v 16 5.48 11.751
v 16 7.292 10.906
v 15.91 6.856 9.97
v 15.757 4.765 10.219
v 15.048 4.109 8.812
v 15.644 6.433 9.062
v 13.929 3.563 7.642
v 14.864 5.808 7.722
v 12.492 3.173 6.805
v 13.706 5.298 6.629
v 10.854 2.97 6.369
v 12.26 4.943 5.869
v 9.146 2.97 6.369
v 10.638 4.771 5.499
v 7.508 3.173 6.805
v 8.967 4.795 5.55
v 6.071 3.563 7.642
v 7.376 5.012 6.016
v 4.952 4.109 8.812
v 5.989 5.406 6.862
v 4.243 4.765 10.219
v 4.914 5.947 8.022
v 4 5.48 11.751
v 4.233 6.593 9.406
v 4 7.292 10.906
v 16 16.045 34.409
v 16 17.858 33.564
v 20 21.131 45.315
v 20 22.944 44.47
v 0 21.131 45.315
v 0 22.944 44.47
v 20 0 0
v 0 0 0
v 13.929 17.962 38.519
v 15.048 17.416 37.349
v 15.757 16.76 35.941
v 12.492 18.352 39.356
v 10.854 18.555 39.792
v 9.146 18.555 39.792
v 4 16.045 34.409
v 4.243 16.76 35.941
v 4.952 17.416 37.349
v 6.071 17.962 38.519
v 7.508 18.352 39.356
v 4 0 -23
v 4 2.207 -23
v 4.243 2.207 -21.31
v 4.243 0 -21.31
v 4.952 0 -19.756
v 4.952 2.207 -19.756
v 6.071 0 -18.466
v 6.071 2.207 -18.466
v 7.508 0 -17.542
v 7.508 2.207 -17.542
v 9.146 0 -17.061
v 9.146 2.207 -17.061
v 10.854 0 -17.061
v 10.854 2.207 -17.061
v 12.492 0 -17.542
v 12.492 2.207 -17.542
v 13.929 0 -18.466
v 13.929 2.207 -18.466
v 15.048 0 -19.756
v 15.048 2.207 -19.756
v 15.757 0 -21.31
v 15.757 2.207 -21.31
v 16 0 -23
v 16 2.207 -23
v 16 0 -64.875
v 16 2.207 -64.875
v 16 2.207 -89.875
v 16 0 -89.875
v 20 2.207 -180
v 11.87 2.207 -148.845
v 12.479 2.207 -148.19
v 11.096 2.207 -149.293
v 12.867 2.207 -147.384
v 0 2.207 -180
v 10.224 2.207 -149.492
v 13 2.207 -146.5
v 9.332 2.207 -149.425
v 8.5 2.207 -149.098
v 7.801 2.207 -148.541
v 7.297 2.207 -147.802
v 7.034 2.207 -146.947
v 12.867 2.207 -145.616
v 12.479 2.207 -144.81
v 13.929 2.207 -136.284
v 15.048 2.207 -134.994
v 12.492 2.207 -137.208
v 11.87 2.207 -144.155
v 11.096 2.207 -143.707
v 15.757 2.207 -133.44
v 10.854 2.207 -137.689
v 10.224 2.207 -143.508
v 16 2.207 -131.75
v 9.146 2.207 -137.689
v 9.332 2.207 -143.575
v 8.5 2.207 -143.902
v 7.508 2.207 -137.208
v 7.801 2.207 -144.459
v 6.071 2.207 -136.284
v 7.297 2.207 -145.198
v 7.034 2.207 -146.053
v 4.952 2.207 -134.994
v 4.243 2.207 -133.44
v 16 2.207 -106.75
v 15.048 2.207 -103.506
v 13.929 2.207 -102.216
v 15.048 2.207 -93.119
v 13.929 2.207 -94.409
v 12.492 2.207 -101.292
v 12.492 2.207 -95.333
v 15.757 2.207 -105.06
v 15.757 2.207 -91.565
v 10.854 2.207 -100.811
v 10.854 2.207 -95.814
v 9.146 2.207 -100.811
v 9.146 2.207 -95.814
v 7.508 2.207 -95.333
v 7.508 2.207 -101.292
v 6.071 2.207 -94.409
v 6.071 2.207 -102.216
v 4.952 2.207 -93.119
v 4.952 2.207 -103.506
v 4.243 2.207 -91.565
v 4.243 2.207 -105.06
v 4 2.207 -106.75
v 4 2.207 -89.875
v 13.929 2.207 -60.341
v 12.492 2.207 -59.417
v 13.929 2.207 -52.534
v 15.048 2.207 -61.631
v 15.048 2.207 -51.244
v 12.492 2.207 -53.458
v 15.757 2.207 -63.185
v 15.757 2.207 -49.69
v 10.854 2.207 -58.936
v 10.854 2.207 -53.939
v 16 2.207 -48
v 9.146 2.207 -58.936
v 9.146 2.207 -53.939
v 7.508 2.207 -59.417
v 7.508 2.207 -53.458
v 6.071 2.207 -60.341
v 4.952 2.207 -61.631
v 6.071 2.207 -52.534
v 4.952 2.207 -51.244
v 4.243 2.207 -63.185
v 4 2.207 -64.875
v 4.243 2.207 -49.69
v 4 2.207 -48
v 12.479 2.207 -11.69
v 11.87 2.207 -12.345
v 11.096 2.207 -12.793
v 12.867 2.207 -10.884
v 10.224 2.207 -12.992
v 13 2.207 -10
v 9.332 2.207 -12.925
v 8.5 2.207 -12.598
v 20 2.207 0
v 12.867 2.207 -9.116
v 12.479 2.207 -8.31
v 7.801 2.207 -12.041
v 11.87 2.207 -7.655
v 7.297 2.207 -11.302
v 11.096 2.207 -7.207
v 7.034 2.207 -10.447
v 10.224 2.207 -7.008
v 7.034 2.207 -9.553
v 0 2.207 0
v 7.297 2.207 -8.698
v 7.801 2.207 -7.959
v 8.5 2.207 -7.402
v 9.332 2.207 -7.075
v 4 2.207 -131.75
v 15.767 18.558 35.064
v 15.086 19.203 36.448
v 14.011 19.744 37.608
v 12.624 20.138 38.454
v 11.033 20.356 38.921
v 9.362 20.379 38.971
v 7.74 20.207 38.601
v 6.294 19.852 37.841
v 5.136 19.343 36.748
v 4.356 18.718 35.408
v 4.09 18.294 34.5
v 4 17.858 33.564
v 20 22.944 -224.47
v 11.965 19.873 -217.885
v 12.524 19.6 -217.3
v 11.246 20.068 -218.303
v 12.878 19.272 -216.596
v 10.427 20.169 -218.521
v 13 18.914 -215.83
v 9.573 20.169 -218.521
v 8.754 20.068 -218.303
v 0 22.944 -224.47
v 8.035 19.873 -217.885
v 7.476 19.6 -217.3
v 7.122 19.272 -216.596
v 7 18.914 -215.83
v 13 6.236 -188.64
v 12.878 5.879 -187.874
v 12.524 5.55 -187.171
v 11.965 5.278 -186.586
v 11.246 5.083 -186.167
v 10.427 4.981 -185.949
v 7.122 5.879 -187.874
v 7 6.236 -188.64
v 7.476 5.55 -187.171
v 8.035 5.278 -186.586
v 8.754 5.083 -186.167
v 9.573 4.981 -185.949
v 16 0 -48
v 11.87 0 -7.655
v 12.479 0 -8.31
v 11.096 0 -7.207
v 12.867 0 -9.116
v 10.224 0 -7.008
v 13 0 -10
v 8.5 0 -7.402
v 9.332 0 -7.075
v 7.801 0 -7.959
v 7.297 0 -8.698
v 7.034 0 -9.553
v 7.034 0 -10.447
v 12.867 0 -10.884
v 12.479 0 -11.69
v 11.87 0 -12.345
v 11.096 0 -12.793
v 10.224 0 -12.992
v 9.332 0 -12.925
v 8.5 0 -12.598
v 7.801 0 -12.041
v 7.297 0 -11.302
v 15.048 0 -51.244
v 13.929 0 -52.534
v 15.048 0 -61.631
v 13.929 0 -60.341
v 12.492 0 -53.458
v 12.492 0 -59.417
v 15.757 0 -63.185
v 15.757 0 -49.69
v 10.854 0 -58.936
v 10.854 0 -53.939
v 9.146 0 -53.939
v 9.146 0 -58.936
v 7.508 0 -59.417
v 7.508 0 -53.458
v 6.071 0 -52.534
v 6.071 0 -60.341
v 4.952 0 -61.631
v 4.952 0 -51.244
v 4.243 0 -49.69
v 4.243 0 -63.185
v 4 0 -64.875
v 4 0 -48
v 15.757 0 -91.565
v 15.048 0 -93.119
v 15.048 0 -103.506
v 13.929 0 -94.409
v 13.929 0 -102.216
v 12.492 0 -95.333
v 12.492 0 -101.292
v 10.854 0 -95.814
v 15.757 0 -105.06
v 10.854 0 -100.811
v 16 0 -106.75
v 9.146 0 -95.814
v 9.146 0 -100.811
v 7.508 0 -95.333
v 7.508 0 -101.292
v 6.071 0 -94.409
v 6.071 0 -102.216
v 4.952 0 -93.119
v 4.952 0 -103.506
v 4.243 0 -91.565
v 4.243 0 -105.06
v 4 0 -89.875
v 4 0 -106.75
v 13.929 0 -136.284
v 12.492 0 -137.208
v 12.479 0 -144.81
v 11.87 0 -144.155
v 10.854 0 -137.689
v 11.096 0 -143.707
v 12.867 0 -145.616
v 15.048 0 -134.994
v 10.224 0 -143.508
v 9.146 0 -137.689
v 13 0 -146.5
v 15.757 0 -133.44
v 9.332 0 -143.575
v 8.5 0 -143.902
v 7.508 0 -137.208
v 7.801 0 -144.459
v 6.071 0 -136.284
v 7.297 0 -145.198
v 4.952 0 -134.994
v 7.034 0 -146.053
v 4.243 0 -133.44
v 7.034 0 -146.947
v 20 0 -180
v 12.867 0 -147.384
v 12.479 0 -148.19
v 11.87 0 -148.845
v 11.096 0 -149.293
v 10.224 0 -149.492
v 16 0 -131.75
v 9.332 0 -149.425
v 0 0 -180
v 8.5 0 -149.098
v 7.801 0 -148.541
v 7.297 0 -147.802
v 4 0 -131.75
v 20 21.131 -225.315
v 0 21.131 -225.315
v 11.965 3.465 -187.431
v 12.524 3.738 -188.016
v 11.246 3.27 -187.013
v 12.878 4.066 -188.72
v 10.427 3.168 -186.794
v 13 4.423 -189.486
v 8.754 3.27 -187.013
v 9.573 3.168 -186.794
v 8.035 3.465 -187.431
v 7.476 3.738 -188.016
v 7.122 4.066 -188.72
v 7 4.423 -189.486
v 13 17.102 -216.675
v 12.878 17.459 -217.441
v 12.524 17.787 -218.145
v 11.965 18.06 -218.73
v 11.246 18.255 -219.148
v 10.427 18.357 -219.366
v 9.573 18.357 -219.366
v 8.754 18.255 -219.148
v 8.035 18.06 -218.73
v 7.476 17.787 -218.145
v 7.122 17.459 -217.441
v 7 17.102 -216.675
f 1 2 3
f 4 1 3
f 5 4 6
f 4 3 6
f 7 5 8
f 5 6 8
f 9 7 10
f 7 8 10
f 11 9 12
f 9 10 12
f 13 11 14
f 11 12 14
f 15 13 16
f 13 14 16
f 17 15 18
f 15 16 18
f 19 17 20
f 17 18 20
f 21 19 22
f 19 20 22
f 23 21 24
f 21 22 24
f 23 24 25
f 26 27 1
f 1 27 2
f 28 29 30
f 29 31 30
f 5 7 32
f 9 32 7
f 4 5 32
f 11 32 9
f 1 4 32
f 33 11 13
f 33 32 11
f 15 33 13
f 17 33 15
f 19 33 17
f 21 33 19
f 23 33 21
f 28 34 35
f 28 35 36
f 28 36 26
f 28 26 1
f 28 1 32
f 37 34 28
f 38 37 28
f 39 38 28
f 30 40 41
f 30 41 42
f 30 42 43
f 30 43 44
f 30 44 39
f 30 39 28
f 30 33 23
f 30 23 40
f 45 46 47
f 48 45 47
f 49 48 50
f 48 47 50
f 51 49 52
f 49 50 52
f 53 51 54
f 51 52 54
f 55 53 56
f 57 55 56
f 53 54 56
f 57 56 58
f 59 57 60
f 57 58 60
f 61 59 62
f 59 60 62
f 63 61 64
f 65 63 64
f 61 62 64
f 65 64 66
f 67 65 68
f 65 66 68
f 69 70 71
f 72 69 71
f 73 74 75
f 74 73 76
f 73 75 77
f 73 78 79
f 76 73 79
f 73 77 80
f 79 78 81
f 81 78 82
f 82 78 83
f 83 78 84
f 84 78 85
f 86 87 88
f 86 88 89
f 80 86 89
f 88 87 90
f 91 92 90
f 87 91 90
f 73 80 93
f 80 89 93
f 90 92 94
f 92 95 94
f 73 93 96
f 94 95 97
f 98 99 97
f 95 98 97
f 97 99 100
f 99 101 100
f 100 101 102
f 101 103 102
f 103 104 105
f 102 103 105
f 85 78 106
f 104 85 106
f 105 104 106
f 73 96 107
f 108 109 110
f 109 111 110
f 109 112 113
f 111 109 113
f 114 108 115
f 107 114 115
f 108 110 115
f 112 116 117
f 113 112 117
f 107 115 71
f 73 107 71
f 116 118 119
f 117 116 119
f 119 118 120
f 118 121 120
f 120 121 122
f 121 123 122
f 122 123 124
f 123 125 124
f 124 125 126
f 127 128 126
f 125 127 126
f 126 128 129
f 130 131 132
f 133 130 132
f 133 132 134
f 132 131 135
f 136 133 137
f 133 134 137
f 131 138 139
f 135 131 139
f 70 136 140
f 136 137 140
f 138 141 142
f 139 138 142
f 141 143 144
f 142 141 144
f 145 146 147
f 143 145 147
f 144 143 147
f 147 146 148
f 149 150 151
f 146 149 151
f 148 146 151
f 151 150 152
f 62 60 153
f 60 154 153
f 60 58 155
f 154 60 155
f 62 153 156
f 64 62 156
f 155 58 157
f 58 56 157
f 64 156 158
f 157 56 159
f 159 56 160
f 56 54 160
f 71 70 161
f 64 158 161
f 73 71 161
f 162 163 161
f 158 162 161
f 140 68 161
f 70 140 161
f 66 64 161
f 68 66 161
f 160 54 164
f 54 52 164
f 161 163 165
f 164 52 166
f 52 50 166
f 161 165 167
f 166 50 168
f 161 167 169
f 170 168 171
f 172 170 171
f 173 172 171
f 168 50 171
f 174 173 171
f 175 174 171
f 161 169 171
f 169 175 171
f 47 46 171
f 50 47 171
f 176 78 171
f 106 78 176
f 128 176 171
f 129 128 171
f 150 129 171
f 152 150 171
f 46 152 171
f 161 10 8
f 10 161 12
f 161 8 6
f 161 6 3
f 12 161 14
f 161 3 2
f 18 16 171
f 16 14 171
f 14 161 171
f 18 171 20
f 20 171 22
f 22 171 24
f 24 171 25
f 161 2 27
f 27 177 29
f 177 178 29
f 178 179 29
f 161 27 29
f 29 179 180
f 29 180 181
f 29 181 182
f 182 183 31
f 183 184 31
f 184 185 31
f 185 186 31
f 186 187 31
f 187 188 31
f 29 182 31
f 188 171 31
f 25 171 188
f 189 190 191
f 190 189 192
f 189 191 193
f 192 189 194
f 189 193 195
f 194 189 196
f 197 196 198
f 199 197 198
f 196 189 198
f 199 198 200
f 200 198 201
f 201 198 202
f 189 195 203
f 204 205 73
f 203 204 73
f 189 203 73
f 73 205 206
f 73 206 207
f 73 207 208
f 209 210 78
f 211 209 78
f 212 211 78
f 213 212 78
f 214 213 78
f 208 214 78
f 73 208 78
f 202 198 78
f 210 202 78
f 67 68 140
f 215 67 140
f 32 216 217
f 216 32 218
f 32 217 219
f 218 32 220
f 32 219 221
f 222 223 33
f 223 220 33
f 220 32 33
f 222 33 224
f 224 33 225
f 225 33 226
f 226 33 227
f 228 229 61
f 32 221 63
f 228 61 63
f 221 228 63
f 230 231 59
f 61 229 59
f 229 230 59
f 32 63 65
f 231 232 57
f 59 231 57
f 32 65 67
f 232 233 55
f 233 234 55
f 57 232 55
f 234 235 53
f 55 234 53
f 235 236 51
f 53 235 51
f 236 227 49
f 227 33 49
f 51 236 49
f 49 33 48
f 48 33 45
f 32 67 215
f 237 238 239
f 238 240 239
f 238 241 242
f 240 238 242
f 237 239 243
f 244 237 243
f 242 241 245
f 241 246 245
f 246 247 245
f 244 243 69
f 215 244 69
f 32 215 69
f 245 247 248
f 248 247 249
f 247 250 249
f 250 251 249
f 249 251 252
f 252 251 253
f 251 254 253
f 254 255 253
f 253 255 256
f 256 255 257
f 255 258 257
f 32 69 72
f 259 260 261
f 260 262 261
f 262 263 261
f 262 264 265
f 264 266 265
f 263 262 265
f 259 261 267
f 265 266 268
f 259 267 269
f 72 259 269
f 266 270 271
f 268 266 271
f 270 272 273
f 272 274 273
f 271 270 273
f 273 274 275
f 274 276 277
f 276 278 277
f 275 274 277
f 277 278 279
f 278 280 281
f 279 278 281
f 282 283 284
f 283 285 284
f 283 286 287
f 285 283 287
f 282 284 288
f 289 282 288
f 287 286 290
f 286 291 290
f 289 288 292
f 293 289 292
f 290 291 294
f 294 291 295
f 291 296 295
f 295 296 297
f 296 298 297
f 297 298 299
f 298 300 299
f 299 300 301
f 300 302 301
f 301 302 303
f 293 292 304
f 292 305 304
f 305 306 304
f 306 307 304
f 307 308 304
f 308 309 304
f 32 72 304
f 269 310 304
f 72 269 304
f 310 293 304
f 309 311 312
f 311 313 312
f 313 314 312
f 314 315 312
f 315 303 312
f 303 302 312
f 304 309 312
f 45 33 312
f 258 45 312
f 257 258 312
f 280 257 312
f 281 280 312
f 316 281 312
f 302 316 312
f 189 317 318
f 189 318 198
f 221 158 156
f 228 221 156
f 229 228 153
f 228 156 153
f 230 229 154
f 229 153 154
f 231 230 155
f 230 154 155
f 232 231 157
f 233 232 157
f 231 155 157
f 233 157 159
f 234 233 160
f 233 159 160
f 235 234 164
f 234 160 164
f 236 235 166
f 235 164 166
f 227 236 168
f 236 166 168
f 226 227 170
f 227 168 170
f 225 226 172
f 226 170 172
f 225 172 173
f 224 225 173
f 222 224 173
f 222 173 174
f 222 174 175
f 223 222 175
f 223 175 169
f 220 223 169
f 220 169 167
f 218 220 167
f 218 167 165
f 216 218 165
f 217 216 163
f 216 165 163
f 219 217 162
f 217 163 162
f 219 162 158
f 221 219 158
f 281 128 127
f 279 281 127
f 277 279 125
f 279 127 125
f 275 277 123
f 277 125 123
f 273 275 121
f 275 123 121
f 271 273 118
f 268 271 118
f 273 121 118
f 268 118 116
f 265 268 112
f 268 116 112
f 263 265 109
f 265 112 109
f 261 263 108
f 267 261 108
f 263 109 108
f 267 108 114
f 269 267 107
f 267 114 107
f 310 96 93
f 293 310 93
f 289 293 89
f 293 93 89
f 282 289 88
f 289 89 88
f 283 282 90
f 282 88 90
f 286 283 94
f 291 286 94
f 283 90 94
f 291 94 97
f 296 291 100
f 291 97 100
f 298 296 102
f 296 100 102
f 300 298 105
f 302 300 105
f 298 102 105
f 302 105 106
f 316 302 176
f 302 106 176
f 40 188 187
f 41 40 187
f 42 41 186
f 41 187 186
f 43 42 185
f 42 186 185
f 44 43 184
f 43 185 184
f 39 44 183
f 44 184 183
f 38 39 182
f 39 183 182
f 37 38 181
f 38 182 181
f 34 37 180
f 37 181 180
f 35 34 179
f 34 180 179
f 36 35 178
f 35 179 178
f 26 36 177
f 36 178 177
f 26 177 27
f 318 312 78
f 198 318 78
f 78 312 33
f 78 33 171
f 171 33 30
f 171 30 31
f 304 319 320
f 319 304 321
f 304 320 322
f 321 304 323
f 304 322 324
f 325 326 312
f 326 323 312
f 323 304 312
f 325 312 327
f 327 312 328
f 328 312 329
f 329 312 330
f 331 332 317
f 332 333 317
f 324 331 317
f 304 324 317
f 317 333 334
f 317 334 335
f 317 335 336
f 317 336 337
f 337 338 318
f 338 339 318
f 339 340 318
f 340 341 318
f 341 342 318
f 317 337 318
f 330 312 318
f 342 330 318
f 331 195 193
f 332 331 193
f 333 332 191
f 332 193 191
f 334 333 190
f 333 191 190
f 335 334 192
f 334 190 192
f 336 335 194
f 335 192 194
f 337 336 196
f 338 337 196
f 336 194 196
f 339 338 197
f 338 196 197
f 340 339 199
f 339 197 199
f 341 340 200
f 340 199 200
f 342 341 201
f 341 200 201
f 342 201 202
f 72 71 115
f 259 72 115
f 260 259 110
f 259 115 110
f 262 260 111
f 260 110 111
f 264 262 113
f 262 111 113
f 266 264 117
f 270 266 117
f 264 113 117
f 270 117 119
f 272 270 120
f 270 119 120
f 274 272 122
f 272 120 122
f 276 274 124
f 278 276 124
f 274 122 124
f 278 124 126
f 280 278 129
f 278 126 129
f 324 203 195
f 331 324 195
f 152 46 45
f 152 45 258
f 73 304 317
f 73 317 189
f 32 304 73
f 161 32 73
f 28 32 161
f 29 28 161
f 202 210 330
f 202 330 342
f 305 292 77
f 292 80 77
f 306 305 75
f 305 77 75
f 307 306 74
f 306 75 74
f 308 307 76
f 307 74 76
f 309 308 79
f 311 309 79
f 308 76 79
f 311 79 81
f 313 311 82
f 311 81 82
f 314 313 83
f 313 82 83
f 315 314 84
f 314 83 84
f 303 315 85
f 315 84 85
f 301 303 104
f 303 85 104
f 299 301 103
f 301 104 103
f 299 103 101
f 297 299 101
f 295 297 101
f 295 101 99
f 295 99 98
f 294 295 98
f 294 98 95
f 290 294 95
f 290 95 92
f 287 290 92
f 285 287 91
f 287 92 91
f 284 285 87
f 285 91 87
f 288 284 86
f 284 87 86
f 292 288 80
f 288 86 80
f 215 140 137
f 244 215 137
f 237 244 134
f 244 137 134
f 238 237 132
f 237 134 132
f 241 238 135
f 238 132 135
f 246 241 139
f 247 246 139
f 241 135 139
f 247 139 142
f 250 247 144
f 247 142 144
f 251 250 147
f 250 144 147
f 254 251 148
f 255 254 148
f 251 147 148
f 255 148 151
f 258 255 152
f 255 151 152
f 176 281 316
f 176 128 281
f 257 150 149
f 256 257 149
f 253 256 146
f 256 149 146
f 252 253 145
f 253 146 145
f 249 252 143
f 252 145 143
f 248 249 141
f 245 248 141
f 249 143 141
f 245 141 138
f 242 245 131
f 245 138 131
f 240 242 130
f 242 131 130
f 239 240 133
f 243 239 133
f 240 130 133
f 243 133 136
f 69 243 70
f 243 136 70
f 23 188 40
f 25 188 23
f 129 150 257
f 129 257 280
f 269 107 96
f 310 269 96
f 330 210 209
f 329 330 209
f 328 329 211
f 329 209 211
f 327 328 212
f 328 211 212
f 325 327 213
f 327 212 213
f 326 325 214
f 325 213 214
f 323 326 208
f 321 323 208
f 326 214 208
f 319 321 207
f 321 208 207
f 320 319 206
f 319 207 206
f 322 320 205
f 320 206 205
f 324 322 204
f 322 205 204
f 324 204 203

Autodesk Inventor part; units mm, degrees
ref_plane "XZ Plane" through (0, 0, 0) normal (0, 1, 0) x (-1, 0, 0)
ref_plane "XY Plane" through (0, 0, 0) normal (0, 0, 1) x (1, 0, 0)
sketch "Sketch1" plane through (0, 0, 0) normal (1, 0, 0) x (0, 1, 0)
  line L0 (0, 0) -> (0, -180)
  line L1 (0, -180) -> (21.1309, -225.3154)
  line L2 (21.1309, -225.3154) -> (22.9435, -224.4702)
  line L3 (22.9435, -224.4702) -> (2.2068, -180)
  line L4 (2.2068, -180) -> (2.2068, 0)
  line L5 (2.2068, 0) -> (22.9435, 44.4702)
  line L6 (22.9435, 44.4702) -> (21.1309, 45.3154)
  line L7 (0, 0) -> (21.1309, 45.3154)
  line L8 (0, 0) -> (67.9565, 0) construction
  dimension "d0" = 180
  dimension "d1" = 25
  dimension "d2" = 25
  dimension "d3" = 2
  dimension "d4" = 50
  dimension "d5" = 50
extrude "base" add sketch "Sketch1" along normal blind 20
sketch "Sketch2" plane through (0, 2.2068, 0) normal (0, 1, 0) x (1, 0, 0)
  circle A0 centre (10, 10) radius 3
  circle A1 centre (10, 146.5) radius 3
  line L0 (0, 0) -> (20, 0) construction
  line L1 (10, 0) -> (10, 23.1136) construction
  dimension "d8" = 6
  dimension "d9" = 6
  dimension "d10" = 10
  dimension "d11" = 136.5
extrude "holes" cut sketch "Sketch2" against normal blind 25
sketch "Sketch3" plane through (0, 2.2068, -180) normal (0, 0.9063, 0.4226) x (1, 0, 0)
  line L0 (0, 49.0674) -> (20, 49.0674) construction
  line L1 (10, 49.0674) -> (10, 4.5106) construction
  point P0 (0, -164.068)
  point P1 (10, 19.0674)
  dimension "d14" = 30
hole "ballastHole_originalAtTheFront" [suppressed]
sketch "Sketch4" plane through (0, 2.2068, 0) normal (0, 1, 0) x (1, 0, 0)
  line L0 (0, 0) -> (20, 0) projected
  line L1 (0, 180) -> (20, 180) projected
  line L2 (10, 180) -> (10, 136)
  dimension "d30" = 44
hole "ballastHole" [suppressed]
sketch "Sketch5" plane through (0, 2.2068, -180) normal (0, 0.9063, 0.4226) x (1, 0, 0)
  line L0 (0, 0) -> (20, 0) construction
  line L1 (10, 0) -> (10, 49.0674) construction
  line L2 (0, 49.0674) -> (20, 49.0674) construction
  arc A0 (7, 9.5337) -> (13, 9.5337) centre (10, 9.5337) ccw
  line L3 (10, 9.5337) -> (7, 9.5337) construction
  line L4 (10, 9.5337) -> (13, 9.5337) construction
  line L5 (7, 9.5337) -> (7, 39.5337)
  line L6 (13, 9.5337) -> (13, 39.5337)
  arc A1 (13, 39.5337) -> (7, 39.5337) centre (10, 39.5337) ccw
  line L7 (10, 39.5337) -> (13, 39.5337) construction
  line L8 (10, 39.5337) -> (7, 39.5337) construction
  point P0 (0, -164.068)
  point P1 (10, 6.5337)
  dimension "d31" = 180
  dimension "d32" = 3
  dimension "d33" = 30
  dimension "d34" = 180
  dimension "d35" = 49.0674
  dimension "d36" = 6.5337
extrude "Extrusion3" cut sketch "Sketch5" against normal blind 10
sketch "Sketch6" plane through (0, 22.9435, 44.4702) normal (0, 0.9063, -0.4226) x (1, 0, 0)
  line L0 (0, 0) -> (20, 0) construction
  line L1 (10, 0) -> (10, 50) construction
  line L2 (0, 50) -> (20, 50) construction
  arc A0 (4, 12.0337) -> (16, 12.0337) centre (10, 12.0337) ccw
  line L3 (10, 12.0337) -> (16, 12.0337) construction
  line L4 (10, 12.0337) -> (4, 12.0337) construction
  line L5 (4, 12.0337) -> (4, 37.0337)
  line L6 (16, 12.0337) -> (16, 37.0337)
  line L7 (0, 49.0674) -> (20, 49.0674) construction
  arc A1 (16, 37.0337) -> (4, 37.0337) centre (10, 37.0337) ccw
  line L8 (10, 37.0337) -> (16, 37.0337) construction
  line L9 (10, 37.0337) -> (4, 37.0337) construction
  point P0 (10, 6.0337)
  dimension "d39" = 180
  dimension "d40" = 6
  dimension "d41" = 25
  dimension "d42" = 49.0674
  dimension "d43" = 6.0337
  dimension "d44" = 180
extrude "Extrusion4" cut sketch "Sketch6" against normal blind 10
sketch "Sketch7" plane through (0, 2.2068, 0) normal (0, 1, 0) x (1, 0, 0)
  line L0 (0, 0) -> (20, 0) construction
  line L1 (10, 0) -> (10, 180) construction
  line L2 (0, 180) -> (20, 180) construction
  arc A0 (4, 23) -> (16, 23) centre (10, 23) ccw
  line L3 (10, 23) -> (16, 23) construction
  line L4 (10, 23) -> (4, 23) construction
  line L5 (4, 23) -> (4, 48)
  line L6 (16, 23) -> (16, 48)
  circle A1 centre (10, 10) radius 3 construction
  line L7 (10, 13) -> (24.9558, 13) construction
  arc A2 (16, 48) -> (4, 48) centre (10, 48) ccw
  line L8 (10, 48) -> (4, 48) construction
  line L9 (10, 48) -> (16, 48) construction
  line L10 (10, 64.875) -> (4, 64.875) construction
  line L11 (10, 64.875) -> (16, 64.875) construction
  arc A3 (4, 64.875) -> (16, 64.875) centre (10, 64.875) ccw
  line L12 (4, 64.875) -> (4, 89.875)
  line L13 (16, 64.875) -> (16, 89.875)
  line L14 (10, 89.875) -> (4, 89.875) construction
  line L15 (10, 89.875) -> (16, 89.875) construction
  arc A4 (16, 89.875) -> (4, 89.875) centre (10, 89.875) ccw
  circle A5 centre (10, 146.5) radius 3 construction
  line L16 (10, 143.5) -> (28.9866, 143.5) construction
  line L17 (10, 106.75) -> (4, 106.75) construction
  line L18 (10, 106.75) -> (16, 106.75) construction
  arc A6 (4, 106.75) -> (16, 106.75) centre (10, 106.75) ccw
  line L19 (4, 106.75) -> (4, 131.75)
  line L20 (16, 106.75) -> (16, 131.75)
  line L21 (10, 131.75) -> (4, 131.75) construction
  line L22 (10, 131.75) -> (16, 131.75) construction
  arc A7 (16, 131.75) -> (4, 131.75) centre (10, 131.75) ccw
  point P0 (10, 17)
  point P1 (10, 58.875)
  point P2 (10, 100.75)
  point P3 (10, 7)
  dimension "d47" = 180
  dimension "d48" = 6
  dimension "d49" = 25
  dimension "d52" = 180
  dimension "d55" = 41.875
  dimension "d62" = 130.5
  dimension "d68" = 7
  dimension "d69" = 10
extrude "Extrusion5" cut sketch "Sketch7" against normal blind 10
ref_plane "Work Plane1" through (10, 22.9435, 44.4702) normal (1, 0, 0) x (0, 1, 0)
equation "\"d9\" = d8"
equation "\"d36\" = -d32 + 0.5 * d35 - 0.5 * d33"
equation "\"d43\" = -d40 + 0.5 * d42 - 0.5 * d41"
equation "\"d55\" = d49 + d51 + 2 * d48"
equation "\"d51\" = -1.5 * d48 - 0.75 * d49 + 0.25 * d62"
properties part number "sled" material "Steel"
